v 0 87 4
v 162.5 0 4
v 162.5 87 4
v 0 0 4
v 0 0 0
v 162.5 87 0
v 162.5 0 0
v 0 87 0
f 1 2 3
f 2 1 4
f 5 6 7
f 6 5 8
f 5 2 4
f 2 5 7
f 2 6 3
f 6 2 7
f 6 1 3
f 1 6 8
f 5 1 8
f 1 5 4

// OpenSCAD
/*below dimensions are in units of millimeter(mm)*/

cube([162.5,87,4]);
